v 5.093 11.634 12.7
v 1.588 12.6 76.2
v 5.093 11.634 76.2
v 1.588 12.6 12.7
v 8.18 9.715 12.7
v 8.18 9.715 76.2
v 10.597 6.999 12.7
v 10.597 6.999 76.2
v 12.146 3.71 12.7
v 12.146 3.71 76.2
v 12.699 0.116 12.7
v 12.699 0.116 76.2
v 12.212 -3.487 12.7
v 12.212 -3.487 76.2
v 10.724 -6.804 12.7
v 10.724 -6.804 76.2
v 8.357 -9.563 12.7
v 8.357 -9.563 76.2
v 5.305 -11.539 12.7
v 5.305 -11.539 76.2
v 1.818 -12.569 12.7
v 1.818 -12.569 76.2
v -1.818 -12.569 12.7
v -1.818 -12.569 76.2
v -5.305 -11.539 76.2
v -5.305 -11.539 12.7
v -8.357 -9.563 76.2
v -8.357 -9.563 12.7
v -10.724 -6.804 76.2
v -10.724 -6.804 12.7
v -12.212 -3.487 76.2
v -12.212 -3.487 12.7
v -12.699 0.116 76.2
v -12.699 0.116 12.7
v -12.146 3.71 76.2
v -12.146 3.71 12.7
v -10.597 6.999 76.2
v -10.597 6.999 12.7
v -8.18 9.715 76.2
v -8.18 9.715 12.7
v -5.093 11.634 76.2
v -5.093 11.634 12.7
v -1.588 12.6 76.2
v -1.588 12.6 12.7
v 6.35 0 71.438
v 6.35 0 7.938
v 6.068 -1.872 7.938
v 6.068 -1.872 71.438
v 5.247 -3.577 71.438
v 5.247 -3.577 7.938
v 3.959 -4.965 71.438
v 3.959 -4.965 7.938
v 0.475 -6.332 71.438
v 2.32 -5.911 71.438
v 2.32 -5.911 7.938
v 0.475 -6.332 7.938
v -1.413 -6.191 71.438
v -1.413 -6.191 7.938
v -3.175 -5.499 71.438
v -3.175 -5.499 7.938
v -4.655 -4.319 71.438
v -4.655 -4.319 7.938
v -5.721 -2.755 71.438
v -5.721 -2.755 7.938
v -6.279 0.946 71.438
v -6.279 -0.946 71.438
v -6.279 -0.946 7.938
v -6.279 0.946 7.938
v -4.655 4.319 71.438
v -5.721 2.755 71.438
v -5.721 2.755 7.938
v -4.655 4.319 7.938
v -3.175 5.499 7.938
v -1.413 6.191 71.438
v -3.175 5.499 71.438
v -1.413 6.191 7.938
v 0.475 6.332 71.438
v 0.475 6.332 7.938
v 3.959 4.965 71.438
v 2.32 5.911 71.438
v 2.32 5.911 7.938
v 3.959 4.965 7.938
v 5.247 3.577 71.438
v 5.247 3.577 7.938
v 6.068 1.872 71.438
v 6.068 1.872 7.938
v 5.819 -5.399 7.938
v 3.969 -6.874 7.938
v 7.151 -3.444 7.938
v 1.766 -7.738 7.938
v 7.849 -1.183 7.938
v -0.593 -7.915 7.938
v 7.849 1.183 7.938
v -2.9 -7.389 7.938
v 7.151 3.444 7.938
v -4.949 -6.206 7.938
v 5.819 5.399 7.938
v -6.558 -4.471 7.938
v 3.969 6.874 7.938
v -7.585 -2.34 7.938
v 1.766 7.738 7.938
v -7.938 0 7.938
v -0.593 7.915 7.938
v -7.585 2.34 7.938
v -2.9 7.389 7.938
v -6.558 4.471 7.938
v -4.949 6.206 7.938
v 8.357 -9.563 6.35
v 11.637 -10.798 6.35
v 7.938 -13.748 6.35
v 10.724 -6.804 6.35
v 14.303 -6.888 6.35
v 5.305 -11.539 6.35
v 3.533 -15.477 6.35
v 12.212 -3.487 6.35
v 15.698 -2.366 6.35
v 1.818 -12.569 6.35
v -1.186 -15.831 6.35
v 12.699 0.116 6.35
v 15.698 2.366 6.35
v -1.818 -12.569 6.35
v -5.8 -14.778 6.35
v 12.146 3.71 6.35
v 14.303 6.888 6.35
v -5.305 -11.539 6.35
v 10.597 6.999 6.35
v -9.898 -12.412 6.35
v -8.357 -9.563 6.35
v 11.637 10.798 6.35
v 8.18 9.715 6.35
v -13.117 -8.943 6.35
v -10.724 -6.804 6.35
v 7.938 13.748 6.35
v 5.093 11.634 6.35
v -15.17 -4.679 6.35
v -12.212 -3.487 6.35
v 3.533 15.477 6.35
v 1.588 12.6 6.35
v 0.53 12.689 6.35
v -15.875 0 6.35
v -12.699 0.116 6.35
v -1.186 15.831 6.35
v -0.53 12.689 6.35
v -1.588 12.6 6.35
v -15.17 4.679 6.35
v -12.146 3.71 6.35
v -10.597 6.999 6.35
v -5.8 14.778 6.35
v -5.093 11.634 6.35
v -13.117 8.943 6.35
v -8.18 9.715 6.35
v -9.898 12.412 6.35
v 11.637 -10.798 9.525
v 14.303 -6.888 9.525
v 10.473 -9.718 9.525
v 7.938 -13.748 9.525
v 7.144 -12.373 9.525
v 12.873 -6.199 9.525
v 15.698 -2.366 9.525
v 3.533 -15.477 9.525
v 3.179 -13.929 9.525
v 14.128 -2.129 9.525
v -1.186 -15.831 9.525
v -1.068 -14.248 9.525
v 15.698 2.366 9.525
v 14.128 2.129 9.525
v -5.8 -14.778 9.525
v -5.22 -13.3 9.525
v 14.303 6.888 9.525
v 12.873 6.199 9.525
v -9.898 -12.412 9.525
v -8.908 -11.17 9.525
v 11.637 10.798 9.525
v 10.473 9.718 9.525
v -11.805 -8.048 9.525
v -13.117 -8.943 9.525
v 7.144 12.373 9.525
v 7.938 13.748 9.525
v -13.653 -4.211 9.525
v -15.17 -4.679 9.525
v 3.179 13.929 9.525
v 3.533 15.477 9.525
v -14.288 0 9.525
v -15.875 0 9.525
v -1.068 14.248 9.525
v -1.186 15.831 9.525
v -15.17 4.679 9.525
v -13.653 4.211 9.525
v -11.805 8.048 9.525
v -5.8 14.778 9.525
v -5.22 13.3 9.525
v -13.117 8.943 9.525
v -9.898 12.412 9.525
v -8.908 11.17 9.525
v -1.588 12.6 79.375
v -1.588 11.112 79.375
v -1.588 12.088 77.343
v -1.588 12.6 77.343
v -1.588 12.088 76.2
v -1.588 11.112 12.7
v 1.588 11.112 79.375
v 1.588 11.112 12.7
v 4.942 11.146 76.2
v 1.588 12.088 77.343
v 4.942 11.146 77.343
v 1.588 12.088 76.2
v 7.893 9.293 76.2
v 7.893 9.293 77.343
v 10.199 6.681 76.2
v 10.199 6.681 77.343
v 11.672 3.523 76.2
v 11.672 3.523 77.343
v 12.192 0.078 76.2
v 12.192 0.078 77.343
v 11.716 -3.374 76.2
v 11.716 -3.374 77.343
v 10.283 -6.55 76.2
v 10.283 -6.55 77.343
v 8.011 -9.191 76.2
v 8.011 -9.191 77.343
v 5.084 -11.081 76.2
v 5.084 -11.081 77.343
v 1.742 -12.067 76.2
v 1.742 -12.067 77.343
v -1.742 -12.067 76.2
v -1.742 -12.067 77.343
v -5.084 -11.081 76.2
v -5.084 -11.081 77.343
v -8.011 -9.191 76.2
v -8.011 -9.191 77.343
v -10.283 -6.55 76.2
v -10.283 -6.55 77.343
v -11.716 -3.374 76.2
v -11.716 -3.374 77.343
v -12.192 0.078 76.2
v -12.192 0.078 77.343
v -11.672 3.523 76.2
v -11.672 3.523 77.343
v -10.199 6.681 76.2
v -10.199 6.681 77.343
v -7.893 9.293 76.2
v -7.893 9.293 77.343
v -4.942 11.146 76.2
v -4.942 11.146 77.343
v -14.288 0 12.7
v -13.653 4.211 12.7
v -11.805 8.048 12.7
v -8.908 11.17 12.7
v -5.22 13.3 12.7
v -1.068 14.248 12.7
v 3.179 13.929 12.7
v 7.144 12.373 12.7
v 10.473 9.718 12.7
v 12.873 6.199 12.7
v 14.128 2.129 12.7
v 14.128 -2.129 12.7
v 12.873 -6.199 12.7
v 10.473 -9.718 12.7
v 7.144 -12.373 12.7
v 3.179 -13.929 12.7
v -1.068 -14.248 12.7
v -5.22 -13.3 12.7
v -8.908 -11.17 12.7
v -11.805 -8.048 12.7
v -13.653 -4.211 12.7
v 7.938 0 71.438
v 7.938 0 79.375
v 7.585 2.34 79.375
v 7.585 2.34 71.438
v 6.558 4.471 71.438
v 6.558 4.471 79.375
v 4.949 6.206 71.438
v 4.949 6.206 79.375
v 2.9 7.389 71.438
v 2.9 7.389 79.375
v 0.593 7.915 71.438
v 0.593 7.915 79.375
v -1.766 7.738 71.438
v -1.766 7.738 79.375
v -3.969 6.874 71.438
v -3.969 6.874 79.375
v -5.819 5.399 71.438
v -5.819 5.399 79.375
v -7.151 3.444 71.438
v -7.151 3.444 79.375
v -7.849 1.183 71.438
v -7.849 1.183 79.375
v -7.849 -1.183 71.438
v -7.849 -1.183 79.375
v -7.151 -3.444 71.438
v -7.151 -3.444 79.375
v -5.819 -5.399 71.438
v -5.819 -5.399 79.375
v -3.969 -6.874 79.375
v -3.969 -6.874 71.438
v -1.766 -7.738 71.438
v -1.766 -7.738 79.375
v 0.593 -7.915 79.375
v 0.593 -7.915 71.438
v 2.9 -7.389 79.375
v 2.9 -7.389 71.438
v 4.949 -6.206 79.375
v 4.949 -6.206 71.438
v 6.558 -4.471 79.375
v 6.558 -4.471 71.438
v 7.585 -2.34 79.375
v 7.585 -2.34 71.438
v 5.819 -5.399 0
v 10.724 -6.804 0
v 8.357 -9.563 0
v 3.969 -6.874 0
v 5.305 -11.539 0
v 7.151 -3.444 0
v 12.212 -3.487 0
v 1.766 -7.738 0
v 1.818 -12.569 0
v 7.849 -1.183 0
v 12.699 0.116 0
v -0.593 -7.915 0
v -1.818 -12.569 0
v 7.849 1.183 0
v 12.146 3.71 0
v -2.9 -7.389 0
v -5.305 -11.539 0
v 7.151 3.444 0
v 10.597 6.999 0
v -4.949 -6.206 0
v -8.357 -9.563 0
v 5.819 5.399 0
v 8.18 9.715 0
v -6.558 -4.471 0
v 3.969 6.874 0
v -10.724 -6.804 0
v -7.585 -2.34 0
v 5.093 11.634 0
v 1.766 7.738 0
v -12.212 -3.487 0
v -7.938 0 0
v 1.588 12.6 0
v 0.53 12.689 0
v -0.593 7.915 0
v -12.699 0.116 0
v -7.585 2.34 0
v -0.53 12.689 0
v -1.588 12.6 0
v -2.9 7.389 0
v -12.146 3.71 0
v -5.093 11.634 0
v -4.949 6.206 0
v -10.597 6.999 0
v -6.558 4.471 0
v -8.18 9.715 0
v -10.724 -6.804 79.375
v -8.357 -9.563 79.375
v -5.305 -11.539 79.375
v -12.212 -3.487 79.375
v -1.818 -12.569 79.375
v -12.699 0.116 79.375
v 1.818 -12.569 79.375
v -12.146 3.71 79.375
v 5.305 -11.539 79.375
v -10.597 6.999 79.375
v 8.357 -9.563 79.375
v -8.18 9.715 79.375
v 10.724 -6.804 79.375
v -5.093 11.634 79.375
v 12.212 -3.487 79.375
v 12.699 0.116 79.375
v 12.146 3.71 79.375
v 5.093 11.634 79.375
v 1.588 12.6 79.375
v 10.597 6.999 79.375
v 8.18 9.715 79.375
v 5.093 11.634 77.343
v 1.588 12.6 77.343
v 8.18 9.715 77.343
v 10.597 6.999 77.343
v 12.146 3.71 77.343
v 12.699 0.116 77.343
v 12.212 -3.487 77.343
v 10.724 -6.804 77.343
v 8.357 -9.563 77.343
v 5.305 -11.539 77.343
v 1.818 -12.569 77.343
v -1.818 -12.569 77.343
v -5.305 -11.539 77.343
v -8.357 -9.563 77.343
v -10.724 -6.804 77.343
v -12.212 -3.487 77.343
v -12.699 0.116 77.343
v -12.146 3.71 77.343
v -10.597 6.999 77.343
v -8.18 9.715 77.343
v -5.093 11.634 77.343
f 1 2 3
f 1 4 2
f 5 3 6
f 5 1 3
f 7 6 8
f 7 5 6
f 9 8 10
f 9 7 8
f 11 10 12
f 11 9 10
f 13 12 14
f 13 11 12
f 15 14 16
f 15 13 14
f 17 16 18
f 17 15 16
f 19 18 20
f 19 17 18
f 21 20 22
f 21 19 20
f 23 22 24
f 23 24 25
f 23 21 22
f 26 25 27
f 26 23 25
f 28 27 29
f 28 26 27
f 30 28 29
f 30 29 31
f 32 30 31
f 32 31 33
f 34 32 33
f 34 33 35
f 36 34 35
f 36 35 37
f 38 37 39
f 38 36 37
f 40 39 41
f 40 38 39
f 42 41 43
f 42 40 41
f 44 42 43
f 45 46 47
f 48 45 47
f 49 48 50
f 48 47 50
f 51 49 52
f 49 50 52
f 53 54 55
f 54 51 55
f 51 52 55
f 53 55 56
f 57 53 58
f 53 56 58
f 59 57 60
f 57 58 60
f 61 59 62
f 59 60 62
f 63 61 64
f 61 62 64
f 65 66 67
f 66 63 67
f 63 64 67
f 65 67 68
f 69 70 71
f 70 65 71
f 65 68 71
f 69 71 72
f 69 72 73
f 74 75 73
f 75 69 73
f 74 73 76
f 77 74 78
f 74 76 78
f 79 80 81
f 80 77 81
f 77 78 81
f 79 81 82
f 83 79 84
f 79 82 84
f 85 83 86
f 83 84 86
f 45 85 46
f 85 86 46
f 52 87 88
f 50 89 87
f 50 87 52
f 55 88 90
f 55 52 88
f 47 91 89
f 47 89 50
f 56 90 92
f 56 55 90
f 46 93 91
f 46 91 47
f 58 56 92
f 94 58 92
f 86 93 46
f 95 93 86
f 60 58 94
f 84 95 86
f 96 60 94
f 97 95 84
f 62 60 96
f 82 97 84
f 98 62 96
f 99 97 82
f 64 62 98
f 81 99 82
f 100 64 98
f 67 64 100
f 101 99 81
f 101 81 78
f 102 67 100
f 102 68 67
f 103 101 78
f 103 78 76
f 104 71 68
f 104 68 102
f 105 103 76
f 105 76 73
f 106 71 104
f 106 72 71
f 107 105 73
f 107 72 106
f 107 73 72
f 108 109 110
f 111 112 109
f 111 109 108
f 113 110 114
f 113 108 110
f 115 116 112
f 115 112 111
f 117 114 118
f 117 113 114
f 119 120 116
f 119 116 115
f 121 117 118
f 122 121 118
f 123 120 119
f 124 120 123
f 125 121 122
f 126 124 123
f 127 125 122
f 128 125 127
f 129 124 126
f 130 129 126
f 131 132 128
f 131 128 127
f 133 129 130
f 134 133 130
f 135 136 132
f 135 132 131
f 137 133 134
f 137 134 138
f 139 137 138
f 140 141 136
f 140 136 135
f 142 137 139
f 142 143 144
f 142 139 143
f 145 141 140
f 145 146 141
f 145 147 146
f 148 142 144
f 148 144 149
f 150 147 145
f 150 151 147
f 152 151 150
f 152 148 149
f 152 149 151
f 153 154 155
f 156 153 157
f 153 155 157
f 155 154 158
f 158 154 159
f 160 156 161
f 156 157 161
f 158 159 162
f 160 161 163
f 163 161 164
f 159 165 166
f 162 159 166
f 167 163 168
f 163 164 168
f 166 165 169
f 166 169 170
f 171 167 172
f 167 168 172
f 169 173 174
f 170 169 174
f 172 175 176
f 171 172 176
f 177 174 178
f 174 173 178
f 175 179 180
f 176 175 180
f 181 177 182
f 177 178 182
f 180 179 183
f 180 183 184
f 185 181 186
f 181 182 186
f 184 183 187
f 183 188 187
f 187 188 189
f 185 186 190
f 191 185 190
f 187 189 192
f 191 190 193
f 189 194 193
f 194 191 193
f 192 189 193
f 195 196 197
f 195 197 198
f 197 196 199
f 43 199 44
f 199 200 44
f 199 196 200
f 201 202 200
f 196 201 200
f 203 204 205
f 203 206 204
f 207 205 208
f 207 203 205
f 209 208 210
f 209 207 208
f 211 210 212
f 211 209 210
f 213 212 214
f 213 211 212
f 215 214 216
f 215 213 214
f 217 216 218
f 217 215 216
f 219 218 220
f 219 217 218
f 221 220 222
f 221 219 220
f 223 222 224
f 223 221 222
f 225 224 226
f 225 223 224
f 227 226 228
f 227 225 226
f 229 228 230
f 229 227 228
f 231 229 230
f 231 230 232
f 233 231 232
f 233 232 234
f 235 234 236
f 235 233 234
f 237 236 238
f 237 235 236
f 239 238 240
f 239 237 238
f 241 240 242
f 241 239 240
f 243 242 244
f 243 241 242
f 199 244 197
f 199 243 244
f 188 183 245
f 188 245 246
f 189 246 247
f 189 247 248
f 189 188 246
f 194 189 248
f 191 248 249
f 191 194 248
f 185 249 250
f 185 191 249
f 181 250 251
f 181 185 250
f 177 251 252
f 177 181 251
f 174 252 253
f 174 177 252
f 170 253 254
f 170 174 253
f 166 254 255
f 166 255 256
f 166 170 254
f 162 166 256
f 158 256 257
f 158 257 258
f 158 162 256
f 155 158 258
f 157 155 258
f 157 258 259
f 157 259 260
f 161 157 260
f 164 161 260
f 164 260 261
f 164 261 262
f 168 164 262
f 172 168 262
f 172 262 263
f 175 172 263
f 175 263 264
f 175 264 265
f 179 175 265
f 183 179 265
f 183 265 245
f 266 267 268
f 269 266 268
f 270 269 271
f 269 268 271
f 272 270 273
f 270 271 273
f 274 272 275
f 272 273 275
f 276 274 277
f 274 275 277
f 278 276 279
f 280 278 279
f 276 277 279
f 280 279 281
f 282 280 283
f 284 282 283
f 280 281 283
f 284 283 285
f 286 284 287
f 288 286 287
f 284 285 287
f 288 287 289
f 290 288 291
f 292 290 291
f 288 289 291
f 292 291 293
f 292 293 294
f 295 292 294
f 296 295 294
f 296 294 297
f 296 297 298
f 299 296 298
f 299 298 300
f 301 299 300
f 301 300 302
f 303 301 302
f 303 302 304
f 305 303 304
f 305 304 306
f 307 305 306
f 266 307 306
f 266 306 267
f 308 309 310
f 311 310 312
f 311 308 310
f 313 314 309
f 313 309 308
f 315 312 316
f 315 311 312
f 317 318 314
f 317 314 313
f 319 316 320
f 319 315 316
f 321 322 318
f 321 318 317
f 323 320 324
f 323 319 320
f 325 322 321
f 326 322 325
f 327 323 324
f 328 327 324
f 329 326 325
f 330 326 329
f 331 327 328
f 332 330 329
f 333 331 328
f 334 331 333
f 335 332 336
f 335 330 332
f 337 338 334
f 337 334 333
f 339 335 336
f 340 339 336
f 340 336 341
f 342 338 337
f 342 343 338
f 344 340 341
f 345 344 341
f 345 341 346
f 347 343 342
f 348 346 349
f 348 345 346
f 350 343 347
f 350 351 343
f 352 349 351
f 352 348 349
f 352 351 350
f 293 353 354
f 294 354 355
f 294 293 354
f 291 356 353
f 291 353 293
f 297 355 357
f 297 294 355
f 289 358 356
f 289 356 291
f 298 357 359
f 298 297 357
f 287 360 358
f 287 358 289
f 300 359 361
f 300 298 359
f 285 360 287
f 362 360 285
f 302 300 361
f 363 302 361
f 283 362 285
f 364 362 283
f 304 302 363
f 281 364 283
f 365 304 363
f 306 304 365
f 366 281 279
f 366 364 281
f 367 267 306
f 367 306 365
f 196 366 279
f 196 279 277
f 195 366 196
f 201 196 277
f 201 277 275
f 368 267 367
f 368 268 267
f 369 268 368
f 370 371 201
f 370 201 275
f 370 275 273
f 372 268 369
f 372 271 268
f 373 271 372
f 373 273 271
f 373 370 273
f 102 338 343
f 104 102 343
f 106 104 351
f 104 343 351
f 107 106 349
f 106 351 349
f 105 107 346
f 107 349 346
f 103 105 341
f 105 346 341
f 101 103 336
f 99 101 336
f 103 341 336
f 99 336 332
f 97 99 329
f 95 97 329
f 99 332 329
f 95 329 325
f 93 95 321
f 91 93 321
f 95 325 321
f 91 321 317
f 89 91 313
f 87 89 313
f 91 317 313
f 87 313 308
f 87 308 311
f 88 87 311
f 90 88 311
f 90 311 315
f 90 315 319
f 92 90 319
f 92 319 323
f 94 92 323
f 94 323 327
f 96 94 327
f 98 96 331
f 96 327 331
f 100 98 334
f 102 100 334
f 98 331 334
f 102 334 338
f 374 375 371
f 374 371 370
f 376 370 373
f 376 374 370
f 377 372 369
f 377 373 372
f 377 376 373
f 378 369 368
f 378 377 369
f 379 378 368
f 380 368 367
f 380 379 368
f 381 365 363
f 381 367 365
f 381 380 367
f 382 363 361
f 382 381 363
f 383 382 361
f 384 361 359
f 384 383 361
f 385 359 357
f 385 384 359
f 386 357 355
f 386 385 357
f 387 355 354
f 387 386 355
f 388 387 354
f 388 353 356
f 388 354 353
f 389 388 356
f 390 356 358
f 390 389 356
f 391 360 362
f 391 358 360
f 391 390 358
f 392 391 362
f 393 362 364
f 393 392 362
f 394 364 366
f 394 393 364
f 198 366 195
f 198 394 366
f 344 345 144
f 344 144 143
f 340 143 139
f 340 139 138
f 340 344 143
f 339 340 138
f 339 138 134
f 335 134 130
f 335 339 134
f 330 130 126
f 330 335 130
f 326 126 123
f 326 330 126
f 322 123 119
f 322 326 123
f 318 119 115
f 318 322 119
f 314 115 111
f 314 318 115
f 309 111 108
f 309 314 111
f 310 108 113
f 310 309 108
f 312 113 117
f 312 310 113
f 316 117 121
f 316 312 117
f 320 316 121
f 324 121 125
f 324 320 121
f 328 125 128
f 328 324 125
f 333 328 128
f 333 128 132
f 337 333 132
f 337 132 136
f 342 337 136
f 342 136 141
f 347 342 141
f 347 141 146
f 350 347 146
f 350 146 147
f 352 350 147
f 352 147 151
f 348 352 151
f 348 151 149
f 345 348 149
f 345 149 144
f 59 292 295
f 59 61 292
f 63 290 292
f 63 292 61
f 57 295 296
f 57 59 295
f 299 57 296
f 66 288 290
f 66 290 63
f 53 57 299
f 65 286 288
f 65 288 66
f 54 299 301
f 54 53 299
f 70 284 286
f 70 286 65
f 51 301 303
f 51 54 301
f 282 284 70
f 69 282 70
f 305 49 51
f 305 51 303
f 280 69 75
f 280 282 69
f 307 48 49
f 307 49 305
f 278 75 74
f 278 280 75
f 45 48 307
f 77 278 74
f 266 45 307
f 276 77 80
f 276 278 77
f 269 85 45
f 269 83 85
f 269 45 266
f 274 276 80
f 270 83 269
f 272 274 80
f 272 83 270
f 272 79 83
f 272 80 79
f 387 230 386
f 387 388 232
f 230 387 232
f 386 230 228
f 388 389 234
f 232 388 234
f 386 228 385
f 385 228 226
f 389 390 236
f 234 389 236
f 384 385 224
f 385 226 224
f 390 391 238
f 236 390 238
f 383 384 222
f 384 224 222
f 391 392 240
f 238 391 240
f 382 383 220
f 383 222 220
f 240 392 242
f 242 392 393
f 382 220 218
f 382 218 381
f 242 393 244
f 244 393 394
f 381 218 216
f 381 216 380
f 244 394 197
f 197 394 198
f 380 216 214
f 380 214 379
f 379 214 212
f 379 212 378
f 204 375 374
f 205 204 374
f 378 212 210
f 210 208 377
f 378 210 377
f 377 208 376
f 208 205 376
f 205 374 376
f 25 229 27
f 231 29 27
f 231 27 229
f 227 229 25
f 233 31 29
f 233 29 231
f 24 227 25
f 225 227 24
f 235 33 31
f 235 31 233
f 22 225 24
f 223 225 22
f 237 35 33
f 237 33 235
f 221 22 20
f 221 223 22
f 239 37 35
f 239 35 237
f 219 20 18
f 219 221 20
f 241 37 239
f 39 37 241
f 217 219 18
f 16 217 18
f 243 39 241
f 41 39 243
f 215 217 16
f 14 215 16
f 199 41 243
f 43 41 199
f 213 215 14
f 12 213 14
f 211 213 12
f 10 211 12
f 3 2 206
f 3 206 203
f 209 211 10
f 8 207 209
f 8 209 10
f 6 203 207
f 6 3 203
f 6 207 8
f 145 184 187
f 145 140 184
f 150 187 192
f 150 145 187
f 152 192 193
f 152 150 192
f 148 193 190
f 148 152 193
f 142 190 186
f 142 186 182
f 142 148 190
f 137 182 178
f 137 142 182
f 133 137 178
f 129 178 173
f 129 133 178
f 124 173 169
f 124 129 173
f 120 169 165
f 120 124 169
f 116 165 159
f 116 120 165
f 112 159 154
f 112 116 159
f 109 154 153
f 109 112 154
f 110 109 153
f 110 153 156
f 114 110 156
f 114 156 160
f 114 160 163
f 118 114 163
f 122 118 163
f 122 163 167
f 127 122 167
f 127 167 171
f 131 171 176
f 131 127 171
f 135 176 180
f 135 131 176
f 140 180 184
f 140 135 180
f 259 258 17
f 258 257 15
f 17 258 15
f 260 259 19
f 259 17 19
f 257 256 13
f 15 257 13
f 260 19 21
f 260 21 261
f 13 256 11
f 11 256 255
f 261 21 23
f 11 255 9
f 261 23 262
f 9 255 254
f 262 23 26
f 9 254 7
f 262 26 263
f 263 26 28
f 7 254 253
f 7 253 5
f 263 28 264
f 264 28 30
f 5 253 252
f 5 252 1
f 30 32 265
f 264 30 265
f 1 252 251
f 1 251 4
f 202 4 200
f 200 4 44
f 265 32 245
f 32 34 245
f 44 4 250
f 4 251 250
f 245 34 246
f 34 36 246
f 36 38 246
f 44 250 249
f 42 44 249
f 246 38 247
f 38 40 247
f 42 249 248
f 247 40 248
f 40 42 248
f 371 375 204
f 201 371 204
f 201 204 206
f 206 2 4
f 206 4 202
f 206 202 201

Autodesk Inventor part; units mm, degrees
sketch "Sketch1" plane through (0, 0, 0) normal (0, 0, 1) x (1, 0, 0)
  circle A0 centre (0, 0) radius 12.7
  circle A1 centre (0, 0) radius 6.35
  line L0 (-1.5875, 14.2875) -> (1.5875, 14.2875)
  line L1 (1.5875, 14.2875) -> (1.5875, 11.1125)
  line L2 (1.5875, 11.1125) -> (-1.5875, 11.1125)
  line L3 (-1.5875, 11.1125) -> (-1.5875, 14.2875)
  dimension "d0" = 25.4
  dimension "d4" = 12.7
  dimension "d50" = 3.175
  dimension "d51" = 3.175
  dimension "d52" = 1.5875
  dimension "d53" = 14.2875
extrude "Extrusion4" add sketch "Sketch1" along normal blind 79.375 contours A0 L3 L2 L1 | L1 L2 L3 A0
ref_plane "Work Plane5" through (0, 0, 76.2) normal (0, 0, 1) x (1, 0, 0)
sketch "Sketch6" plane through (0, 0, 76.2) normal (0, 0, 1) x (1, 0, 0)
  circle A0 centre (0, 0) radius 12.192
  circle A1 centre (0, 0) radius 12.7 projected
  dimension "d24" = 24.384
extrude "Extrusion8" cut sketch "Sketch6" along normal blind 1.143
ref_plane "Work Plane6" through (0, 0, 15.113) normal (0, 0, -1) x (-1, 0, 0)
ref_plane "Work Plane9" through (0, 0, 43.3324) normal (0, 0, -1) x (-1, 0, 0)
ref_plane "Work Plane10" through (0, 0, 29.464) normal (0, 0, -1) x (-1, 0, 0)
extrude "Extrusion16" cut sketch "Sketch1" along normal through all contours L1 L2 L3 A0 | A0 L3 L0 L1 picked at (0.1768, 11.638)
sketch "Sketch14" plane through (0, 0, 79.375) normal (0, 0, 1) x (1, 0, 0)
  circle A0 centre (0, 0) radius 6.35 projected
  circle A1 centre (0, 0) radius 7.9375
  dimension "d56" = 15.875
extrude "Extrusion17" cut sketch "Sketch14" against normal blind 7.9375
sketch "Sketch15" plane through (0, 0, 0) normal (0, 0, -1) x (-1, 0, 0)
  circle A0 centre (0, 0) radius 6.35 projected
  circle A1 centre (0, 0) radius 7.9375
  dimension "d59" = 15.875
extrude "Extrusion18" cut sketch "Sketch15" against normal blind 7.9375
ref_plane "Work Plane13" through (0, 0, 6.35) normal (0, 0, -1) x (-1, 0, 0)
sketch "Sketch16" plane through (0, 0, 6.35) normal (0, 0, -1) x (-1, 0, 0)
  arc A0 (-1.5875, 12.6004) -> (1.5875, 12.6004) centre (0, 0) ccw projected
  line L0 (-1.5875, 12.6004) -> (-1.5875, 11.1125) projected
  line L1 (-1.5875, 11.1125) -> (1.5875, 11.1125) projected
  line L2 (1.5875, 11.1125) -> (1.5875, 12.6004) projected
  circle A1 centre (0, 0) radius 15.875
  circle A2 centre (0, 0) radius 14.2875
  dimension "d63" = 31.75
  dimension "d68" = 28.575
extrude "Extrusion19" add sketch "Sketch16" against normal blind 3.175 contours A1 | A2
sketch "Sketch17" plane through (0, 0, 0) normal (0, 0, -1) x (-1, 0, 0)
  line L0 (-1.5875, 11.1125) -> (-1.5875, 12.6004) projected
  arc A0 (-1.5875, 12.6004) -> (1.5875, 12.6004) centre (0, 0) ccw projected
  line L1 (1.5875, 12.6004) -> (1.5875, 11.1125) projected
  line L2 (1.5875, 11.1125) -> (-1.5875, 11.1125) projected
  arc A1 (1.5875, 12.6004) -> (-1.5875, 12.6004) centre (0, 0) ccw
extrude "Extrusion20" add sketch "Sketch17" against normal blind 6.35 contours L0 A1 L1 L2
extrude "Extrusion21" add sketch "Sketch16" against normal blind 6.35 contours A2
equation "\"d51\" = d50"
equation "\"d52\" = 0.5 * d50"
equation "\"d53\" = 0.5 * d0 + 0.5 * d50"
properties part number "turn shaft 3"
